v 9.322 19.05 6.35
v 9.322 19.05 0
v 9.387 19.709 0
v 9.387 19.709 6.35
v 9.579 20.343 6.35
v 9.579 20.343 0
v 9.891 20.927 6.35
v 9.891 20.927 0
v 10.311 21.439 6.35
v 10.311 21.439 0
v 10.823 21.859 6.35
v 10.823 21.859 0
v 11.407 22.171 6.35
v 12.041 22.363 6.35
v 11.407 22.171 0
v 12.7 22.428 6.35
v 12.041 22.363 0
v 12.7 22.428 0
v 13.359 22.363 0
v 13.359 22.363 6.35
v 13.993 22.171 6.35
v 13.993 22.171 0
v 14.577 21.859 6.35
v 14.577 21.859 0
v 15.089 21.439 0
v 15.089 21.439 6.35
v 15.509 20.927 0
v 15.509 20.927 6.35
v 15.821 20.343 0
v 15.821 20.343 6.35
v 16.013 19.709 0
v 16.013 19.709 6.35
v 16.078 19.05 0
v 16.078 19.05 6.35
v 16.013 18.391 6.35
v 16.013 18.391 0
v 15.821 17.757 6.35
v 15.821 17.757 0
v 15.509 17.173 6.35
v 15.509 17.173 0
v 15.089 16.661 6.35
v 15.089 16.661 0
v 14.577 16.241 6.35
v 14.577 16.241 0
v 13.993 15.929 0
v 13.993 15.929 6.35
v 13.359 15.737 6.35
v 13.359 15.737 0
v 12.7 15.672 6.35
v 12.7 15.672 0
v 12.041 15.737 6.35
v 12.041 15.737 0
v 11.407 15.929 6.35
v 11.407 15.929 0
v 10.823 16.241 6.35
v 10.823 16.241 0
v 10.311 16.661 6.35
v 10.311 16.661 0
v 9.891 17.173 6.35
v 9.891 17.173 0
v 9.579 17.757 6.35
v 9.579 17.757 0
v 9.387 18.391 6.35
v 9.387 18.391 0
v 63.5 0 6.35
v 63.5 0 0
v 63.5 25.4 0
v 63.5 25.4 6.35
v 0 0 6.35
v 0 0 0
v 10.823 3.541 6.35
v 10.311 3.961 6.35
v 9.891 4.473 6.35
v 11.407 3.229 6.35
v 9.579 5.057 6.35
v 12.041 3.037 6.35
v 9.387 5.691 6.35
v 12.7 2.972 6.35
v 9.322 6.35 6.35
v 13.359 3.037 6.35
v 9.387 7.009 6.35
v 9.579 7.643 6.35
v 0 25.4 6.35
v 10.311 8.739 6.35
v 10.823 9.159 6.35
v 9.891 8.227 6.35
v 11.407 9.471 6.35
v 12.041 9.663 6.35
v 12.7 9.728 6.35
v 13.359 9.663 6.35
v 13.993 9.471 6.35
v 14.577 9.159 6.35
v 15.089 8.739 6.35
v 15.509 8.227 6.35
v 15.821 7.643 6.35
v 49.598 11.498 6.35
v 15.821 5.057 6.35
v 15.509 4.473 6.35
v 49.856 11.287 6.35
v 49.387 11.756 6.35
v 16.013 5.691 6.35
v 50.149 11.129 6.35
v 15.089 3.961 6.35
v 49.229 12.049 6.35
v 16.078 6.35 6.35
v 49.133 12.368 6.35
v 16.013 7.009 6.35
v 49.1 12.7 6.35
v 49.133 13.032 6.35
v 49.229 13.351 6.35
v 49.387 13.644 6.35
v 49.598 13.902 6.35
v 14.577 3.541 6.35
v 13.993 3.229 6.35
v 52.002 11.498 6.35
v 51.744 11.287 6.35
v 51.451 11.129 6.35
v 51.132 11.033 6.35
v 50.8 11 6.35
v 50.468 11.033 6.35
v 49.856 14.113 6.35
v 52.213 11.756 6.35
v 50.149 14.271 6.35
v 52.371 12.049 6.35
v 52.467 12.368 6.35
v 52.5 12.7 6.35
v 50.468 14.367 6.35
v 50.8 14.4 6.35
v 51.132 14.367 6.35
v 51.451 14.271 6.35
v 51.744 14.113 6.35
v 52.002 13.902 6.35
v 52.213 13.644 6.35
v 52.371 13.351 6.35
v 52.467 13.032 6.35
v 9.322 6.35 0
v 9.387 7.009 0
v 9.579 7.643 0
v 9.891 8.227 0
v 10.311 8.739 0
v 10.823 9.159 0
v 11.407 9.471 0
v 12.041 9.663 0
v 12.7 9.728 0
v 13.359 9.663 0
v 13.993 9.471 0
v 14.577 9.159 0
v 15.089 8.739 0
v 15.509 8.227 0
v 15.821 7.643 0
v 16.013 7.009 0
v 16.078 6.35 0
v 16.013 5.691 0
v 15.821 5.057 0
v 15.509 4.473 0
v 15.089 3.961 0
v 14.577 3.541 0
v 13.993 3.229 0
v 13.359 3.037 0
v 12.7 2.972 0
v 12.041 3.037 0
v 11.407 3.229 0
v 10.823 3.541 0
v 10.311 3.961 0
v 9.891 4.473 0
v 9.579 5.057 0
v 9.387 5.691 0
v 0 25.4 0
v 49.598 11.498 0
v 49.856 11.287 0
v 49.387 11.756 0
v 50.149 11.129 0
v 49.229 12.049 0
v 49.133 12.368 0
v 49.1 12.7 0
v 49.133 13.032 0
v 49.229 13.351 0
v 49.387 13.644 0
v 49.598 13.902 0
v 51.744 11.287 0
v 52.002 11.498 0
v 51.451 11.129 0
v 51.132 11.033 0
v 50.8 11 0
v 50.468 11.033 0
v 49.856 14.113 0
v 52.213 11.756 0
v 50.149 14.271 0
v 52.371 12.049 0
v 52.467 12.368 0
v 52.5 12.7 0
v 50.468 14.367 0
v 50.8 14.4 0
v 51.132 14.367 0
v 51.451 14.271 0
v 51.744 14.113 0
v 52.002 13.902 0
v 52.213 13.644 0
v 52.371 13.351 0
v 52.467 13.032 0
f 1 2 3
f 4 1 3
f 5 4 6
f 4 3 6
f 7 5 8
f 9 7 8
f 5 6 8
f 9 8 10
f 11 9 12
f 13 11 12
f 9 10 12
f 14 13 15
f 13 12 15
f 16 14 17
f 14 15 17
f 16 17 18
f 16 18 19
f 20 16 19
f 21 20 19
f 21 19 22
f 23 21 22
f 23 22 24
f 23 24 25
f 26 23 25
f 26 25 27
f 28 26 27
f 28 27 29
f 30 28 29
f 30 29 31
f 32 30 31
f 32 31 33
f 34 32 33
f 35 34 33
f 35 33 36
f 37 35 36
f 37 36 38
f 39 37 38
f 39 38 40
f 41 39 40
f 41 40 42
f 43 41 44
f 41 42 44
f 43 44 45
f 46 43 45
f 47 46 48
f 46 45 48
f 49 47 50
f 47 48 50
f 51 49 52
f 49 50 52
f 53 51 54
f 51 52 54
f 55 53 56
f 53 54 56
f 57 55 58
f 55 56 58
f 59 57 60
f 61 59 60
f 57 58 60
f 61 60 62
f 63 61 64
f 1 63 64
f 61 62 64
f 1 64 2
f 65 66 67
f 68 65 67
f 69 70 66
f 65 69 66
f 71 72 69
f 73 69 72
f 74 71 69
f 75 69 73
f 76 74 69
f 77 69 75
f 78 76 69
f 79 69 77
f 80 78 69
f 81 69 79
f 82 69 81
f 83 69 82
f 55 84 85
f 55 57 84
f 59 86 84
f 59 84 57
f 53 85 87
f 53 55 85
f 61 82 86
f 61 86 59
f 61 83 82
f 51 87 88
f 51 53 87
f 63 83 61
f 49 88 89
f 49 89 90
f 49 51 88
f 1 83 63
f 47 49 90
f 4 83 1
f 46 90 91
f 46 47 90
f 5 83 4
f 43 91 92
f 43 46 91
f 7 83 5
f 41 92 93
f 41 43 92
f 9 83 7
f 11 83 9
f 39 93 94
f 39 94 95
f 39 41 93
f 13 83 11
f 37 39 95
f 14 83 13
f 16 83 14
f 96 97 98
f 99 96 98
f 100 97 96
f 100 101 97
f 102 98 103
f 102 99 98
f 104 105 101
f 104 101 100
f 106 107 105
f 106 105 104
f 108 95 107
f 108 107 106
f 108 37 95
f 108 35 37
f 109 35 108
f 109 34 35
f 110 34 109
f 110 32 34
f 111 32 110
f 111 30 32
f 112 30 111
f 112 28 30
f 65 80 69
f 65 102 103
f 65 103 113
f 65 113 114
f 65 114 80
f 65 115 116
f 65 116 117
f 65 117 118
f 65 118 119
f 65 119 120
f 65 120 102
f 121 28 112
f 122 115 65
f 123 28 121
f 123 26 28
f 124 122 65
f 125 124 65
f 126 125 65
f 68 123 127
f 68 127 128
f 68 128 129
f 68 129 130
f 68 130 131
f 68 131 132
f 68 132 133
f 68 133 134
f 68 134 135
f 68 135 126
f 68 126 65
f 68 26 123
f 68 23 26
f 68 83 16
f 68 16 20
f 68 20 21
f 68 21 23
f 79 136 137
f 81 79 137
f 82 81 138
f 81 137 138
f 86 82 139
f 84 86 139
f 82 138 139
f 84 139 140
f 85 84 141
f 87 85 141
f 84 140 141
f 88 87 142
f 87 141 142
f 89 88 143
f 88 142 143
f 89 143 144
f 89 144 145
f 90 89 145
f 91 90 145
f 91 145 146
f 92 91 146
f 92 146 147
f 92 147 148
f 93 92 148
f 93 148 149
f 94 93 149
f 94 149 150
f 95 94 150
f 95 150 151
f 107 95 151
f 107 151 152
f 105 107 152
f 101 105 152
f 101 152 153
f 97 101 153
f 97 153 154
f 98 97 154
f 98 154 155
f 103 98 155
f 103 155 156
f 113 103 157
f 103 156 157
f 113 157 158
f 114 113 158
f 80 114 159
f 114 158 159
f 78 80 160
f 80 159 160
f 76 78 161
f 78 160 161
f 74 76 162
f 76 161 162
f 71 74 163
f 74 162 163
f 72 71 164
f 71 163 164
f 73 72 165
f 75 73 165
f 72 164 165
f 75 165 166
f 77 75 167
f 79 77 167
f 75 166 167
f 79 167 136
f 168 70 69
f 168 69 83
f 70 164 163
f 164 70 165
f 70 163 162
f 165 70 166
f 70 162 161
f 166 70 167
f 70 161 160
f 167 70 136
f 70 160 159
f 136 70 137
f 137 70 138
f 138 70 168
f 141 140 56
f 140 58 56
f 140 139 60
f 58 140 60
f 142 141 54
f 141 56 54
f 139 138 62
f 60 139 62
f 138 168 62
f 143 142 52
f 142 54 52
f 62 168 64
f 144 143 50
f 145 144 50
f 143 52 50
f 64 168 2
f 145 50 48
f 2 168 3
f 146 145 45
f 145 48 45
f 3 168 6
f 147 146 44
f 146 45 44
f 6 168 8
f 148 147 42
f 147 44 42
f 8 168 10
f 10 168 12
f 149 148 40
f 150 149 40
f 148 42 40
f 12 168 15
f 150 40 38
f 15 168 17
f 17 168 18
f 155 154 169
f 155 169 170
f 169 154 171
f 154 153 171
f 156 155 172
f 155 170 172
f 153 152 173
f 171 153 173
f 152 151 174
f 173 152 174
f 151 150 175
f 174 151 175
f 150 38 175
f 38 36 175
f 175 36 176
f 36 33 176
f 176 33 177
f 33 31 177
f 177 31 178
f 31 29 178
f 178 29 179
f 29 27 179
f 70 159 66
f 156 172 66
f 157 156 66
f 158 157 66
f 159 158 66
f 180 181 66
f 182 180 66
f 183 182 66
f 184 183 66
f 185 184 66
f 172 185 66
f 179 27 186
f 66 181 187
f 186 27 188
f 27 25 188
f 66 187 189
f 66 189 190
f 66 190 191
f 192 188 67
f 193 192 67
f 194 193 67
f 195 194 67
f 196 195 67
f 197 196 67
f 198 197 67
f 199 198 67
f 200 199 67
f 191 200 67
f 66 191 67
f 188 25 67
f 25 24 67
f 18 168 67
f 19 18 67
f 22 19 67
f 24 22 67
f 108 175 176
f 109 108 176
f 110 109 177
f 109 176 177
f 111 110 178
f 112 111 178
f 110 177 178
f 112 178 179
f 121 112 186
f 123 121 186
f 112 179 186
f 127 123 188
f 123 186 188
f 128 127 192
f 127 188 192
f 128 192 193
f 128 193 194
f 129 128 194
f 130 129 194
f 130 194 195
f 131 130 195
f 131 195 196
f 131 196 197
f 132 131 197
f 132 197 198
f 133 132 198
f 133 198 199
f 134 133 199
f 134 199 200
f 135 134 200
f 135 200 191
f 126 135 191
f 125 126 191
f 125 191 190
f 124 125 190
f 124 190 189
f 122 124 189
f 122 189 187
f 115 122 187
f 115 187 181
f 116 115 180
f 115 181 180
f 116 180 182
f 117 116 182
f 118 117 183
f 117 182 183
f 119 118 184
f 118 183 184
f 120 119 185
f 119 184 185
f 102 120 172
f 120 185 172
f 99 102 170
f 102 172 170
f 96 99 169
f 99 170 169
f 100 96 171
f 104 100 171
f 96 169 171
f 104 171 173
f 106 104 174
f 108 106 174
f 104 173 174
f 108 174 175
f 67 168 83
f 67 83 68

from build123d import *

# Parameters (mm, degrees)
SKETCH1_W               = 63.5
SKETCH1_H               = 25.4
BOSS_EXTRUDE1_DEPTH     = 6.35
F_1_4_CLEARANCE_HOLE1_D = 6.7564
M3_CLEARANCE_HOLE1_D    = 3.4


with BuildPart() as part:
    # Sketch1 → Boss-Extrude1 (new body)
    with BuildSketch(Plane.XY):
        with Locations((31.75, 12.7)):
            Rectangle(SKETCH1_W, SKETCH1_H)
    extrude(amount=BOSS_EXTRUDE1_DEPTH)

    # 1/4 Clearance Hole1 (through all)
    with Locations(Plane.XY.offset(6.35)):
        with Locations((12.7, 6.35), (12.7, 19.05)):
            Hole(F_1_4_CLEARANCE_HOLE1_D / 2)

    # M3 Clearance Hole1 (through all)
    with Locations(Plane.XY.offset(6.35)):
        with Locations((50.8, 12.7)):
            Hole(M3_CLEARANCE_HOLE1_D / 2)


solid = part.part
